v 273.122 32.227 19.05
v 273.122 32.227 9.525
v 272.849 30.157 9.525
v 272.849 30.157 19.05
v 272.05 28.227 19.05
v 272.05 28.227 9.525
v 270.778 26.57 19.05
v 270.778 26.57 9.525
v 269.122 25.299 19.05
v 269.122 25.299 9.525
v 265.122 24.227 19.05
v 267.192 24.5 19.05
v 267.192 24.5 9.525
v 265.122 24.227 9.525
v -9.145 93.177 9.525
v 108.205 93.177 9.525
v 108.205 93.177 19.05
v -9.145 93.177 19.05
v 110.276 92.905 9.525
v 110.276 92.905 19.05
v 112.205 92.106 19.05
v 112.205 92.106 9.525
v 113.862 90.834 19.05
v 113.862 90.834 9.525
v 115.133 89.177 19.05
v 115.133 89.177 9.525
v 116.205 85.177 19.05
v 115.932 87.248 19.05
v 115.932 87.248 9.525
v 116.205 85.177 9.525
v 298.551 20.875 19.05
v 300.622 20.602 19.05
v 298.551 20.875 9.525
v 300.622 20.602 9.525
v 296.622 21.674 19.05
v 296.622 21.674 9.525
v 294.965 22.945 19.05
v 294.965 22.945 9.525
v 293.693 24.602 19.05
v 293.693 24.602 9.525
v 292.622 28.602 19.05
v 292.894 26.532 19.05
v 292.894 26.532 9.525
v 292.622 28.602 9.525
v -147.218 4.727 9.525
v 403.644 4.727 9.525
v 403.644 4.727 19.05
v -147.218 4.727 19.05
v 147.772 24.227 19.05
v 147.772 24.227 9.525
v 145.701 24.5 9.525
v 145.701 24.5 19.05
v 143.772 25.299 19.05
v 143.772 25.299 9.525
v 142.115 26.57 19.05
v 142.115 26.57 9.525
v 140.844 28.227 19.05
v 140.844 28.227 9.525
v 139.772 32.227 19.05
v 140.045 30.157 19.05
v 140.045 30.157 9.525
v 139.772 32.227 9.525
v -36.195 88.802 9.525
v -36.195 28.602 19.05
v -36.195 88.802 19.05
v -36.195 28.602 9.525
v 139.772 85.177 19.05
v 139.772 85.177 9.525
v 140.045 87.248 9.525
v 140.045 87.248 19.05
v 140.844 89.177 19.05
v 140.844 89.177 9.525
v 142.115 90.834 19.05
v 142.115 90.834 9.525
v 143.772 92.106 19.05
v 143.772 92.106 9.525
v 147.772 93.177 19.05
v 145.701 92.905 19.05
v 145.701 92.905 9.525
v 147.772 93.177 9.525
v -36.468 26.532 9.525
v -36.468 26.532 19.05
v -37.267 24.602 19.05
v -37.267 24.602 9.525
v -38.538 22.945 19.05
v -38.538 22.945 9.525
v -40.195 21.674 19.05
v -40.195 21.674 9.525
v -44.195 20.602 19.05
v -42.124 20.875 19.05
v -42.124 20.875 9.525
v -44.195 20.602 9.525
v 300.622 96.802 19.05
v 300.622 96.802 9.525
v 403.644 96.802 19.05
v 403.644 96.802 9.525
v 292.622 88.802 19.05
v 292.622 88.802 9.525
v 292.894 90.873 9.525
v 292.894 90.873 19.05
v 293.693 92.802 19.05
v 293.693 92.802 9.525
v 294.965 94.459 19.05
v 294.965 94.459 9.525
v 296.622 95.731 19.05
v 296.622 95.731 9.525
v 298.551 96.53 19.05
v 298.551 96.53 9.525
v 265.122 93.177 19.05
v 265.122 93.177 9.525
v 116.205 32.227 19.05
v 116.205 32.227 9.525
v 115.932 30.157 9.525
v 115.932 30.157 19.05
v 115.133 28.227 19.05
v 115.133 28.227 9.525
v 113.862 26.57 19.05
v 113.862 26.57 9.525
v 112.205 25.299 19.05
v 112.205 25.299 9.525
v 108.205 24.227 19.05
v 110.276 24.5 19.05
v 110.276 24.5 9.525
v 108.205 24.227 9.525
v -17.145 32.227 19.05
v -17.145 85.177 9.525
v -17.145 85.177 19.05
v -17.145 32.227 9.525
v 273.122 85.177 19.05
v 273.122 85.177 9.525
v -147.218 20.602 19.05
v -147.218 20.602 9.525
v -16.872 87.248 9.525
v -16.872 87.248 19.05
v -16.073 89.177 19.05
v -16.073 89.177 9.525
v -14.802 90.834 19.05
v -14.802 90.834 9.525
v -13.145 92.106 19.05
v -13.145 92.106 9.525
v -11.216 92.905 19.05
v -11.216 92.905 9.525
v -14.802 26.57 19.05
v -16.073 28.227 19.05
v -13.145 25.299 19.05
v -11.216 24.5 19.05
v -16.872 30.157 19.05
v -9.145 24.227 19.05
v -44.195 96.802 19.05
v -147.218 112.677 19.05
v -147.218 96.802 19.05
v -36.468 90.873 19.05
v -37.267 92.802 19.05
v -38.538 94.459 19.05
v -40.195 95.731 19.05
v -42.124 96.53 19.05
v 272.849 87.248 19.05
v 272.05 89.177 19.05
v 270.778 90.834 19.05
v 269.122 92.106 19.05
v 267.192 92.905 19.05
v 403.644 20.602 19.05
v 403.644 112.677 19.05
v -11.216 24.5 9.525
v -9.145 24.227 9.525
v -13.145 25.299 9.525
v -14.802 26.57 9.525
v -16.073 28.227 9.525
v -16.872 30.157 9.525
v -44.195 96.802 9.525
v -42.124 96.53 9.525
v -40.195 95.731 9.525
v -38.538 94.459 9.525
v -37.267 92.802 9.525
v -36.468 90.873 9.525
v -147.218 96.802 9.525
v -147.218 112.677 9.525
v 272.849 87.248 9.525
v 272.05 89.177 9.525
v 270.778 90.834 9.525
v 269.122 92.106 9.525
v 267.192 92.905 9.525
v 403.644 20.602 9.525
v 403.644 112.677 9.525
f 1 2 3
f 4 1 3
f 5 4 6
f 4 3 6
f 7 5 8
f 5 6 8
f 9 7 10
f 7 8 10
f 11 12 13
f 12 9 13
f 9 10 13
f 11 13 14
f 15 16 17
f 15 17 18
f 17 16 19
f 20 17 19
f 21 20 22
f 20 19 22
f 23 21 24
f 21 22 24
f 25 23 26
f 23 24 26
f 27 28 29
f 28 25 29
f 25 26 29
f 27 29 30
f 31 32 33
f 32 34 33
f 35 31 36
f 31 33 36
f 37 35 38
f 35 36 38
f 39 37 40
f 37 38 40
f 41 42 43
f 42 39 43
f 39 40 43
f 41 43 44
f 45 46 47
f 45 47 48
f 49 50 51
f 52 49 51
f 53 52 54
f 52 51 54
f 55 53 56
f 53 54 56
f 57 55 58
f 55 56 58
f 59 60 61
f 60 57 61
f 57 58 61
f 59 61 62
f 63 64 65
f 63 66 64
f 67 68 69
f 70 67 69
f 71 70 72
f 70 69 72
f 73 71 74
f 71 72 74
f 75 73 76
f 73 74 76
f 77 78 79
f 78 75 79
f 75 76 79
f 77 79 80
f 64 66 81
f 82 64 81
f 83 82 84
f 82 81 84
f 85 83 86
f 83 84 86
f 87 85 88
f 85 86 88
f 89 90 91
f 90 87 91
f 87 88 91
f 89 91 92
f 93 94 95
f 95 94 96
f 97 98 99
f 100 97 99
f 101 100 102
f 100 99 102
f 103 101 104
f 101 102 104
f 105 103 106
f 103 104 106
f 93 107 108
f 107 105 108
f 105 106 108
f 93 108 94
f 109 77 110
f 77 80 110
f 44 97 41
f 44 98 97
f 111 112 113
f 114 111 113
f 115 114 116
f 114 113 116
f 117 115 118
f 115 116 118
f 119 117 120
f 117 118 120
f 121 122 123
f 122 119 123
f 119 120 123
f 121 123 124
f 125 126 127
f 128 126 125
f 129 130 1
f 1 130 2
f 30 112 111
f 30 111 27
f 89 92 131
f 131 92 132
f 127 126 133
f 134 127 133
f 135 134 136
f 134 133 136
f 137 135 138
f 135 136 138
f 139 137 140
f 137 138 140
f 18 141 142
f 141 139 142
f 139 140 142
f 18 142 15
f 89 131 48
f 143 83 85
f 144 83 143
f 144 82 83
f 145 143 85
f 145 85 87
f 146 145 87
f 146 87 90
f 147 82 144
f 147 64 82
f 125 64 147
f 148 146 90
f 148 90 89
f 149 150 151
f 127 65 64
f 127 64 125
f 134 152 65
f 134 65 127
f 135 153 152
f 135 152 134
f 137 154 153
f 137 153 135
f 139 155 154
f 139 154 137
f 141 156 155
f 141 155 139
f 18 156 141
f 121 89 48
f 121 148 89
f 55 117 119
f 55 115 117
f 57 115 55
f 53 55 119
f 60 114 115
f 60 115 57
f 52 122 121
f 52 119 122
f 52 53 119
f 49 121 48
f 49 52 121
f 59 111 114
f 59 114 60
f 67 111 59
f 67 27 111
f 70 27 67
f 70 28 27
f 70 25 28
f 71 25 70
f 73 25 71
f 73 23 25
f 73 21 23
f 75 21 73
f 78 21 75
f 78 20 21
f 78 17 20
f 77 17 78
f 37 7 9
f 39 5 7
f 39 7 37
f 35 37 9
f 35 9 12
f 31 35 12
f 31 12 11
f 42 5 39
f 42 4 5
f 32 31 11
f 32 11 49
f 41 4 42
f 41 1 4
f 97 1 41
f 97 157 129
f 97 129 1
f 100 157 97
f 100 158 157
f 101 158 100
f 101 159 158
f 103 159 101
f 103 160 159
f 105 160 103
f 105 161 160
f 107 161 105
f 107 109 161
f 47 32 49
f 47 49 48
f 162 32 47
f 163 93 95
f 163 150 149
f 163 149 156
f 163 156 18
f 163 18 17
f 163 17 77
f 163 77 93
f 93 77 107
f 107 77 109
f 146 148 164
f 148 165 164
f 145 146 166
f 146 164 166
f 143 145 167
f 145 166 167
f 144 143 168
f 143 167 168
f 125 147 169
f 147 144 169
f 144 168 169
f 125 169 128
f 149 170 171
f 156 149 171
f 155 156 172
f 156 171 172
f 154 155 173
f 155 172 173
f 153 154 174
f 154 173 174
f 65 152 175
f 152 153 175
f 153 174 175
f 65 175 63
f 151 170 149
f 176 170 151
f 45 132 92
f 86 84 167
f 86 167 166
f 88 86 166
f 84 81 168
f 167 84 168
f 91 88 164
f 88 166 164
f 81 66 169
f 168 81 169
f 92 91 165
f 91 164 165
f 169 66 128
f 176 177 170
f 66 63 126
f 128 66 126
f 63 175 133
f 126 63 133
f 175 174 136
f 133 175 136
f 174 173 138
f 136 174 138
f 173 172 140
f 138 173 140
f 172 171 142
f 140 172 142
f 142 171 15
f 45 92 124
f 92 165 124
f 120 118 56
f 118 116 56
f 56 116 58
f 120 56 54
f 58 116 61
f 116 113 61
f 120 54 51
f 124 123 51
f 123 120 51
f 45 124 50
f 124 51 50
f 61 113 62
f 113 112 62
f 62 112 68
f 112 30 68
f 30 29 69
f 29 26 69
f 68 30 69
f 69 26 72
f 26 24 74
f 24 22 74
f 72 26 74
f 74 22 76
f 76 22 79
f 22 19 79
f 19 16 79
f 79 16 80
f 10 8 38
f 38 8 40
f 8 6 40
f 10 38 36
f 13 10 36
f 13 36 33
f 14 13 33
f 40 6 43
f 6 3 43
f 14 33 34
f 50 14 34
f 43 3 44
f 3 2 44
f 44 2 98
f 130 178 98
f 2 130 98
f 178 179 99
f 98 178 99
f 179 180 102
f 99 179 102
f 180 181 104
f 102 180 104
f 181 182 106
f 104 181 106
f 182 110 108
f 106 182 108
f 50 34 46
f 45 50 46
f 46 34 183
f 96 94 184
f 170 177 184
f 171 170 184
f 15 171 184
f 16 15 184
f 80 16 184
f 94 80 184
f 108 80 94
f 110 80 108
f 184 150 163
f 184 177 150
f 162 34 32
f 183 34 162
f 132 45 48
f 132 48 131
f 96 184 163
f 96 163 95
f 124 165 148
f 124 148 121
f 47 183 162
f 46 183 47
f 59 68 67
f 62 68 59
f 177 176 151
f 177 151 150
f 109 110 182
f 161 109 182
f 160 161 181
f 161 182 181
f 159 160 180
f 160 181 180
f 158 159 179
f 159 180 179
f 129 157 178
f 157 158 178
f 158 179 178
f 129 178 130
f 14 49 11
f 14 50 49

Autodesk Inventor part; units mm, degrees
ref_plane "YZ Plane" through (0, 0, 0) normal (1, 0, 0) x (0, 1, 0)
ref_plane "XZ Plane" through (0, 0, 0) normal (0, 1, 0) x (-1, 0, 0)
ref_plane "XY Plane" through (0, 0, 0) normal (0, 0, 1) x (1, 0, 0)
ref_plane "Work Plane3" through (-147.218, 17.4273, 6.525) normal (0, 0, 1) x (1, 0, 0)
sketch "Sketch7" plane through (-147.218, 17.4273, 6.525) normal (0, 0, 1) x (1, 0, 0)
  line L0 (-4.0025, 142.0373) -> (8.6975, 142.0373)
  line L1 (8.6975, 166.8648) -> (534.16, 166.8648)
  line L2 (534.16, 151.8648) -> (546.86, 151.8648)
  line L3 (534.16, -35.9627) -> (546.86, -35.9627)
  line L4 (8.6975, 158.8648) -> (113.79, 158.8648)
  line L5 (113.79, 142.8648) -> (218.8825, 142.8648)
  line L6 (218.8825, 161.8648) -> (323.975, 161.8648)
  line L7 (323.975, 142.8648) -> (429.0675, 142.8648)
  circle A0 centre (117.7905, 87.3125) radius 3.175
  circle A1 centre (117.7905, -4.7625) radius 3.175
  circle A2 centre (12.6975, 87.3125) radius 3.175
  circle A3 centre (12.6975, -4.7625) radius 3.175
  circle A4 centre (222.8835, 87.3125) radius 3.175
  circle A5 centre (327.9765, 87.3125) radius 3.175
  circle A6 centre (433.0695, 87.3125) radius 3.175
  circle A7 centre (538.1625, 87.3125) radius 3.175
  circle A8 centre (222.8835, -4.7625) radius 3.175
  circle A9 centre (327.9765, -4.7625) radius 3.175
  circle A10 centre (433.0695, -4.7625) radius 3.175
  circle A11 centre (538.1625, -4.7625) radius 3.175
  line L8 (550.8625, -12.7) -> (550.8625, 3.175) projected
  line L9 (-0.0005, 95.25) -> (550.8625, 95.25)
  line L10 (550.8625, 95.25) -> (550.8625, -12.7)
  line L11 (550.8625, -12.7) -> (-0.0005, -12.7)
  line L12 (-0.0005, -12.7) -> (-0.0005, 95.25)
  line L13 (550.862, -9.525) -> (0, -9.525) projected
  point P0 (147.218, -17.4273)
  point P1 (431.29, 55.0373)
  dimension "d164" = 12.7
  dimension "d166" = 525.4625
  dimension "d167" = 12.7
  dimension "d168" = 105.0925
  dimension "d169" = 105.0925
  dimension "d170" = 105.0925
  dimension "d171" = 105.0925
  dimension "d172" = 105.0925
  dimension "d173" = 6.35
  dimension "d174" = 6.35
  dimension "d176" = 6.35
  dimension "d177" = 6.35
  dimension "d178" = 6.35
  dimension "d179" = 6.35
  dimension "d180" = 6.35
  dimension "d181" = 6.35
  dimension "d182" = 6.35
  dimension "d183" = 6.35
  dimension "d184" = 6.35
  dimension "d185" = 107.95
  dimension "d186" = 550.863
  dimension "d189" = 105.093
  dimension "d195" = 105.093
  dimension "d196" = 105.093
  dimension "d197" = 105.093
  dimension "d204" = 105.093
  dimension "d205" = 105.093
  dimension "d209" = 105.093
  dimension "d210" = 105.093
  dimension "d215" = 7.9375
  dimension "d217" = 7.9375
  dimension "d218" = 7.9375
  dimension "d219" = 7.9375
  dimension "d220" = 7.9375
  dimension "d221" = 7.9375
  dimension "d222" = 7.9375
  dimension "d223" = 105.093
  dimension "d224" = 105.093
  dimension "d225" = 7.9375
  dimension "d226" = 7.9375
  dimension "d227" = 7.9375
  dimension "d229" = 7.9375
  dimension "d231" = 12.7
  dimension "d232" = 12.7
  dimension "d233" = 12.698
  dimension "d234" = 7.9375
  dimension "d235" = 12.698
hole "Hole5" [suppressed]
ref_plane "Work Plane4" through (0, 0, 9.525) normal (0, 0, 1) x (1, 0, 0)
sketch "Sketch8" plane through (0, 0, 9.525) normal (0, 0, 1) x (1, 0, 0)
  line L0 (292.6215, 88.8023) -> (292.6215, 28.6023)
  line L1 (273.1215, 85.1773) -> (273.1215, 32.2273)
  line L2 (-36.195, 28.6023) -> (-36.195, 88.8023)
  line L3 (-17.145, 85.1773) -> (-17.145, 32.2273)
  line L4 (-9.145, 24.2273) -> (108.205, 24.2273)
  line L5 (116.205, 32.2273) -> (116.205, 85.1773)
  line L6 (108.205, 93.1773) -> (-9.145, 93.1773)
  line L7 (147.772, 93.1773) -> (265.1215, 93.1773)
  line L8 (139.772, 85.1773) -> (139.772, 32.2273)
  line L9 (147.772, 24.2273) -> (265.1215, 24.2273)
  arc A0 (-9.145, 93.1773) -> (-17.145, 85.1773) centre (-9.145, 85.1773) ccw
  arc A1 (116.205, 85.1773) -> (108.205, 93.1773) centre (108.205, 85.1773) ccw
  arc A2 (-17.145, 32.2273) -> (-9.145, 24.2273) centre (-9.145, 32.2273) ccw
  arc A3 (108.205, 24.2273) -> (116.205, 32.2273) centre (108.205, 32.2273) ccw
  arc A4 (147.772, 93.1773) -> (139.772, 85.1773) centre (147.772, 85.1773) ccw
  arc A5 (273.1215, 85.1773) -> (265.1215, 93.1773) centre (265.1215, 85.1773) ccw
  arc A6 (265.1215, 24.2273) -> (273.1215, 32.2273) centre (265.1215, 32.2273) ccw
  arc A7 (139.772, 32.2273) -> (147.772, 24.2273) centre (147.772, 32.2273) ccw
  arc A8 (300.6215, 96.8023) -> (292.6215, 88.8023) centre (300.6215, 88.8023) ccw
  arc A9 (292.6215, 28.6023) -> (300.6215, 20.6023) centre (300.6215, 28.6023) ccw
  arc A10 (-36.195, 88.8023) -> (-44.195, 96.8023) centre (-44.195, 88.8023) ccw
  arc A11 (-44.195, 20.6023) -> (-36.195, 28.6023) centre (-44.195, 28.6023) ccw
  line L10 (-44.195, 96.8023) -> (-147.218, 96.8023)
  line L11 (-44.195, 20.6023) -> (-147.218, 20.6023)
  line L12 (300.6215, 96.8023) -> (403.6445, 96.8023)
  line L13 (300.6215, 20.6023) -> (403.6445, 20.6023)
  line L14 (-147.218, 112.6773) -> (403.6445, 112.6773)
  line L15 (403.6445, 112.6773) -> (403.6445, 4.7273)
  line L16 (403.6445, 4.7273) -> (-147.218, 4.7273)
  line L17 (-147.218, 4.7273) -> (-147.218, 112.6773)
  line L18 (-147.218, 109.5023) -> (403.6445, 109.5023)
  line L19 (-147.218, 99.9773) -> (403.6445, 99.9773)
  line L20 (-147.218, 7.9023) -> (403.6445, 7.9023)
  line L21 (-147.218, 17.4273) -> (403.6445, 17.4273)
  line L22 (292.6215, 88.8023) -> (292.6215, 28.6023)
  line L23 (273.1215, 85.1773) -> (273.1215, 32.2273)
  line L24 (-36.195, 28.6023) -> (-36.195, 88.8023)
  line L25 (-17.145, 85.1773) -> (-17.145, 32.2273)
  line L26 (-9.145, 24.2273) -> (108.205, 24.2273)
  line L27 (116.205, 32.2273) -> (116.205, 85.1773)
  line L28 (108.205, 93.1773) -> (-9.145, 93.1773)
  line L29 (147.772, 93.1773) -> (265.1215, 93.1773)
  line L30 (139.772, 85.1773) -> (139.772, 32.2273)
  line L31 (147.772, 24.2273) -> (265.1215, 24.2273)
  arc A12 (-9.145, 93.1773) -> (-17.145, 85.1773) centre (-9.145, 85.1773) ccw
  arc A13 (116.205, 85.1773) -> (108.205, 93.1773) centre (108.205, 85.1773) ccw
  arc A14 (-17.145, 32.2273) -> (-9.145, 24.2273) centre (-9.145, 32.2273) ccw
  arc A15 (108.205, 24.2273) -> (116.205, 32.2273) centre (108.205, 32.2273) ccw
  arc A16 (147.772, 93.1773) -> (139.772, 85.1773) centre (147.772, 85.1773) ccw
  arc A17 (273.1215, 85.1773) -> (265.1215, 93.1773) centre (265.1215, 85.1773) ccw
  arc A18 (265.1215, 24.2273) -> (273.1215, 32.2273) centre (265.1215, 32.2273) ccw
  arc A19 (139.772, 32.2273) -> (147.772, 24.2273) centre (147.772, 32.2273) ccw
  arc A20 (300.6215, 96.8023) -> (292.6215, 88.8023) centre (300.6215, 88.8023) ccw
  arc A21 (292.6215, 28.6023) -> (300.6215, 20.6023) centre (300.6215, 28.6023) ccw
  arc A22 (-36.195, 88.8023) -> (-44.195, 96.8023) centre (-44.195, 88.8023) ccw
  arc A23 (-44.195, 20.6023) -> (-36.195, 28.6023) centre (-44.195, 28.6023) ccw
  line L32 (-44.195, 96.8023) -> (-147.218, 96.8023)
  line L33 (-44.195, 20.6023) -> (-147.218, 20.6023)
  line L34 (300.6215, 96.8023) -> (403.6445, 96.8023)
  line L35 (300.6215, 20.6023) -> (403.6445, 20.6023)
  line L36 (-147.218, 112.6773) -> (403.6445, 112.6773)
  line L37 (403.6445, 112.6773) -> (403.6445, 4.7273)
  line L38 (403.6445, 4.7273) -> (-147.218, 4.7273)
  line L39 (-147.218, 4.7273) -> (-147.218, 112.6773)
  line L40 (-147.218, 109.5023) -> (403.6445, 109.5023)
  line L41 (-147.218, 99.9773) -> (403.6445, 99.9773)
  line L42 (-147.218, 7.9023) -> (403.6445, 7.9023)
  line L43 (-147.218, 17.4273) -> (403.6445, 17.4273)
  point P0 (0, 0)
  point P1 (0, 0)
  point P2 (116.205, 58.4523)
  point P3 (0, 0)
  point P4 (0, 0)
  point P5 (116.205, 58.4523)
  dimension "d250" = 133.35
  dimension "d251" = 133.3495
  dimension "d252" = 8
  dimension "d253" = 550.8625
  dimension "d254" = 107.95
  dimension "d255" = 111.023
  dimension "d256" = 111.023
  dimension "d257" = 19.5
  dimension "d258" = 19.5
  dimension "d259" = 19.5
  dimension "d260" = 19.5
  dimension "d261" = 15.875
  dimension "d262" = 3.175
  dimension "d263" = 9.525
  dimension "d264" = 3.175
  dimension "d265" = 9.525
  dimension "d266" = 15.875
  dimension "d267" = 15.875
  dimension "d268" = 76.2
  dimension "d269" = 133.35
  dimension "d270" = 133.3495
  dimension "d271" = 8
  dimension "d272" = 550.8625
  dimension "d273" = 107.95
  dimension "d274" = 111.023
  dimension "d275" = 111.023
  dimension "d276" = 19.5
  dimension "d277" = 19.5
  dimension "d278" = 19.5
  dimension "d279" = 19.5
  dimension "d280" = 15.875
  dimension "d281" = 3.175
  dimension "d282" = 9.525
  dimension "d283" = 3.175
  dimension "d284" = 9.525
  dimension "d285" = 15.875
  dimension "d286" = 15.875
  dimension "d287" = 76.2
extrude "Extrusion4" add sketch "Sketch8" along normal blind 9.525 contours L0 A9 L13 L15 L21 L17 L11 A11 L2 A10 L10 L19 L12 A8 | L19 L17 L18 L15 | L15 L20 L17 L21 | L18 L17 L14 L15 | L15 L16 L17 L20
sketch "Sketch9" plane through (0, 0, 19.05) normal (0, 0, 1) x (1, 0, 0)
  line L0 (292.6215, 88.8023) -> (292.6215, 28.6023)
  line L1 (273.1215, 85.1773) -> (273.1215, 32.2273)
  line L2 (-36.195, 28.6023) -> (-36.195, 88.8023)
  line L3 (-17.145, 85.1773) -> (-17.145, 32.2273)
  line L4 (-9.145, 24.2273) -> (108.205, 24.2273)
  line L5 (116.205, 32.2273) -> (116.205, 85.1773)
  line L6 (108.205, 93.1773) -> (-9.145, 93.1773)
  line L7 (147.772, 93.1773) -> (265.1215, 93.1773)
  line L8 (139.772, 85.1773) -> (139.772, 32.2273)
  line L9 (147.772, 24.2273) -> (265.1215, 24.2273)
  arc A0 (-9.145, 93.1773) -> (-17.145, 85.1773) centre (-9.145, 85.1773) ccw
  arc A1 (116.205, 85.1773) -> (108.205, 93.1773) centre (108.205, 85.1773) ccw
  arc A2 (-17.145, 32.2273) -> (-9.145, 24.2273) centre (-9.145, 32.2273) ccw
  arc A3 (108.205, 24.2273) -> (116.205, 32.2273) centre (108.205, 32.2273) ccw
  arc A4 (147.772, 93.1773) -> (139.772, 85.1773) centre (147.772, 85.1773) ccw
  arc A5 (273.1215, 85.1773) -> (265.1215, 93.1773) centre (265.1215, 85.1773) ccw
  arc A6 (265.1215, 24.2273) -> (273.1215, 32.2273) centre (265.1215, 32.2273) ccw
  arc A7 (139.772, 32.2273) -> (147.772, 24.2273) centre (147.772, 32.2273) ccw
  arc A8 (300.6215, 96.8023) -> (292.6215, 88.8023) centre (300.6215, 88.8023) ccw
  arc A9 (292.6215, 28.6023) -> (300.6215, 20.6023) centre (300.6215, 28.6023) ccw
  arc A10 (-36.195, 88.8023) -> (-44.195, 96.8023) centre (-44.195, 88.8023) ccw
  arc A11 (-44.195, 20.6023) -> (-36.195, 28.6023) centre (-44.195, 28.6023) ccw
  line L10 (-44.195, 96.8023) -> (-147.218, 96.8023)
  line L11 (-44.195, 20.6023) -> (-147.218, 20.6023)
  line L12 (300.6215, 96.8023) -> (403.6445, 96.8023)
  line L13 (300.6215, 20.6023) -> (403.6445, 20.6023)
  line L14 (-147.218, 112.6773) -> (403.6445, 112.6773)
  line L15 (403.6445, 112.6773) -> (403.6445, 4.7273)
  line L16 (403.6445, 4.7273) -> (-147.218, 4.7273)
  line L17 (-147.218, 4.7273) -> (-147.218, 112.6773)
  line L18 (-147.218, 109.5023) -> (403.6445, 109.5023)
  line L19 (-147.218, 99.9773) -> (403.6445, 99.9773)
  line L20 (-147.218, 7.9023) -> (403.6445, 7.9023)
  line L21 (-147.218, 17.4273) -> (403.6445, 17.4273)
  line L22 (292.6215, 88.8023) -> (292.6215, 28.6023)
  line L23 (273.1215, 85.1773) -> (273.1215, 32.2273)
  line L24 (-36.195, 28.6023) -> (-36.195, 88.8023)
  line L25 (-17.145, 85.1773) -> (-17.145, 32.2273)
  line L26 (-9.145, 24.2273) -> (108.205, 24.2273)
  line L27 (116.205, 32.2273) -> (116.205, 85.1773)
  line L28 (108.205, 93.1773) -> (-9.145, 93.1773)
  line L29 (147.772, 93.1773) -> (265.1215, 93.1773)
  line L30 (139.772, 85.1773) -> (139.772, 32.2273)
  line L31 (147.772, 24.2273) -> (265.1215, 24.2273)
  arc A12 (-9.145, 93.1773) -> (-17.145, 85.1773) centre (-9.145, 85.1773) ccw
  arc A13 (116.205, 85.1773) -> (108.205, 93.1773) centre (108.205, 85.1773) ccw
  arc A14 (-17.145, 32.2273) -> (-9.145, 24.2273) centre (-9.145, 32.2273) ccw
  arc A15 (108.205, 24.2273) -> (116.205, 32.2273) centre (108.205, 32.2273) ccw
  arc A16 (147.772, 93.1773) -> (139.772, 85.1773) centre (147.772, 85.1773) ccw
  arc A17 (273.1215, 85.1773) -> (265.1215, 93.1773) centre (265.1215, 85.1773) ccw
  arc A18 (265.1215, 24.2273) -> (273.1215, 32.2273) centre (265.1215, 32.2273) ccw
  arc A19 (139.772, 32.2273) -> (147.772, 24.2273) centre (147.772, 32.2273) ccw
  arc A20 (300.6215, 96.8023) -> (292.6215, 88.8023) centre (300.6215, 88.8023) ccw
  arc A21 (292.6215, 28.6023) -> (300.6215, 20.6023) centre (300.6215, 28.6023) ccw
  arc A22 (-36.195, 88.8023) -> (-44.195, 96.8023) centre (-44.195, 88.8023) ccw
  arc A23 (-44.195, 20.6023) -> (-36.195, 28.6023) centre (-44.195, 28.6023) ccw
  line L32 (-44.195, 96.8023) -> (-147.218, 96.8023)
  line L33 (-44.195, 20.6023) -> (-147.218, 20.6023)
  line L34 (300.6215, 96.8023) -> (403.6445, 96.8023)
  line L35 (300.6215, 20.6023) -> (403.6445, 20.6023)
  line L36 (-147.218, 112.6773) -> (403.6445, 112.6773)
  line L37 (403.6445, 112.6773) -> (403.6445, 4.7273)
  line L38 (403.6445, 4.7273) -> (-147.218, 4.7273)
  line L39 (-147.218, 4.7273) -> (-147.218, 112.6773)
  line L40 (-147.218, 109.5023) -> (403.6445, 109.5023)
  line L41 (-147.218, 99.9773) -> (403.6445, 99.9773)
  line L42 (-147.218, 7.9023) -> (403.6445, 7.9023)
  line L43 (-147.218, 17.4273) -> (403.6445, 17.4273)
  point P0 (0, 0)
  point P1 (0, 0)
  point P2 (0, 0)
  point P3 (116.205, 58.4523)
  point P4 (0, 0)
  point P5 (0, 0)
  point P6 (116.205, 58.4523)
  dimension "d290" = 133.35
  dimension "d291" = 133.3495
  dimension "d292" = 8
  dimension "d293" = 550.8625
  dimension "d294" = 107.95
  dimension "d295" = 111.023
  dimension "d296" = 111.023
  dimension "d297" = 19.5
  dimension "d298" = 19.5
  dimension "d299" = 19.5
  dimension "d300" = 19.5
  dimension "d301" = 15.875
  dimension "d302" = 3.175
  dimension "d303" = 9.525
  dimension "d304" = 3.175
  dimension "d305" = 9.525
  dimension "d306" = 15.875
  dimension "d307" = 15.875
  dimension "d308" = 76.2
  dimension "d309" = 133.35
  dimension "d310" = 133.3495
  dimension "d311" = 8
  dimension "d312" = 550.8625
  dimension "d313" = 107.95
  dimension "d314" = 111.023
  dimension "d315" = 111.023
  dimension "d316" = 19.5
  dimension "d317" = 19.5
  dimension "d318" = 19.5
  dimension "d319" = 19.5
  dimension "d320" = 15.875
  dimension "d321" = 3.175
  dimension "d322" = 9.525
  dimension "d323" = 3.175
  dimension "d324" = 9.525
  dimension "d325" = 15.875
  dimension "d326" = 15.875
  dimension "d327" = 76.2
properties part number "Drivetraintopbottom3" material "Aluminum 6061"
